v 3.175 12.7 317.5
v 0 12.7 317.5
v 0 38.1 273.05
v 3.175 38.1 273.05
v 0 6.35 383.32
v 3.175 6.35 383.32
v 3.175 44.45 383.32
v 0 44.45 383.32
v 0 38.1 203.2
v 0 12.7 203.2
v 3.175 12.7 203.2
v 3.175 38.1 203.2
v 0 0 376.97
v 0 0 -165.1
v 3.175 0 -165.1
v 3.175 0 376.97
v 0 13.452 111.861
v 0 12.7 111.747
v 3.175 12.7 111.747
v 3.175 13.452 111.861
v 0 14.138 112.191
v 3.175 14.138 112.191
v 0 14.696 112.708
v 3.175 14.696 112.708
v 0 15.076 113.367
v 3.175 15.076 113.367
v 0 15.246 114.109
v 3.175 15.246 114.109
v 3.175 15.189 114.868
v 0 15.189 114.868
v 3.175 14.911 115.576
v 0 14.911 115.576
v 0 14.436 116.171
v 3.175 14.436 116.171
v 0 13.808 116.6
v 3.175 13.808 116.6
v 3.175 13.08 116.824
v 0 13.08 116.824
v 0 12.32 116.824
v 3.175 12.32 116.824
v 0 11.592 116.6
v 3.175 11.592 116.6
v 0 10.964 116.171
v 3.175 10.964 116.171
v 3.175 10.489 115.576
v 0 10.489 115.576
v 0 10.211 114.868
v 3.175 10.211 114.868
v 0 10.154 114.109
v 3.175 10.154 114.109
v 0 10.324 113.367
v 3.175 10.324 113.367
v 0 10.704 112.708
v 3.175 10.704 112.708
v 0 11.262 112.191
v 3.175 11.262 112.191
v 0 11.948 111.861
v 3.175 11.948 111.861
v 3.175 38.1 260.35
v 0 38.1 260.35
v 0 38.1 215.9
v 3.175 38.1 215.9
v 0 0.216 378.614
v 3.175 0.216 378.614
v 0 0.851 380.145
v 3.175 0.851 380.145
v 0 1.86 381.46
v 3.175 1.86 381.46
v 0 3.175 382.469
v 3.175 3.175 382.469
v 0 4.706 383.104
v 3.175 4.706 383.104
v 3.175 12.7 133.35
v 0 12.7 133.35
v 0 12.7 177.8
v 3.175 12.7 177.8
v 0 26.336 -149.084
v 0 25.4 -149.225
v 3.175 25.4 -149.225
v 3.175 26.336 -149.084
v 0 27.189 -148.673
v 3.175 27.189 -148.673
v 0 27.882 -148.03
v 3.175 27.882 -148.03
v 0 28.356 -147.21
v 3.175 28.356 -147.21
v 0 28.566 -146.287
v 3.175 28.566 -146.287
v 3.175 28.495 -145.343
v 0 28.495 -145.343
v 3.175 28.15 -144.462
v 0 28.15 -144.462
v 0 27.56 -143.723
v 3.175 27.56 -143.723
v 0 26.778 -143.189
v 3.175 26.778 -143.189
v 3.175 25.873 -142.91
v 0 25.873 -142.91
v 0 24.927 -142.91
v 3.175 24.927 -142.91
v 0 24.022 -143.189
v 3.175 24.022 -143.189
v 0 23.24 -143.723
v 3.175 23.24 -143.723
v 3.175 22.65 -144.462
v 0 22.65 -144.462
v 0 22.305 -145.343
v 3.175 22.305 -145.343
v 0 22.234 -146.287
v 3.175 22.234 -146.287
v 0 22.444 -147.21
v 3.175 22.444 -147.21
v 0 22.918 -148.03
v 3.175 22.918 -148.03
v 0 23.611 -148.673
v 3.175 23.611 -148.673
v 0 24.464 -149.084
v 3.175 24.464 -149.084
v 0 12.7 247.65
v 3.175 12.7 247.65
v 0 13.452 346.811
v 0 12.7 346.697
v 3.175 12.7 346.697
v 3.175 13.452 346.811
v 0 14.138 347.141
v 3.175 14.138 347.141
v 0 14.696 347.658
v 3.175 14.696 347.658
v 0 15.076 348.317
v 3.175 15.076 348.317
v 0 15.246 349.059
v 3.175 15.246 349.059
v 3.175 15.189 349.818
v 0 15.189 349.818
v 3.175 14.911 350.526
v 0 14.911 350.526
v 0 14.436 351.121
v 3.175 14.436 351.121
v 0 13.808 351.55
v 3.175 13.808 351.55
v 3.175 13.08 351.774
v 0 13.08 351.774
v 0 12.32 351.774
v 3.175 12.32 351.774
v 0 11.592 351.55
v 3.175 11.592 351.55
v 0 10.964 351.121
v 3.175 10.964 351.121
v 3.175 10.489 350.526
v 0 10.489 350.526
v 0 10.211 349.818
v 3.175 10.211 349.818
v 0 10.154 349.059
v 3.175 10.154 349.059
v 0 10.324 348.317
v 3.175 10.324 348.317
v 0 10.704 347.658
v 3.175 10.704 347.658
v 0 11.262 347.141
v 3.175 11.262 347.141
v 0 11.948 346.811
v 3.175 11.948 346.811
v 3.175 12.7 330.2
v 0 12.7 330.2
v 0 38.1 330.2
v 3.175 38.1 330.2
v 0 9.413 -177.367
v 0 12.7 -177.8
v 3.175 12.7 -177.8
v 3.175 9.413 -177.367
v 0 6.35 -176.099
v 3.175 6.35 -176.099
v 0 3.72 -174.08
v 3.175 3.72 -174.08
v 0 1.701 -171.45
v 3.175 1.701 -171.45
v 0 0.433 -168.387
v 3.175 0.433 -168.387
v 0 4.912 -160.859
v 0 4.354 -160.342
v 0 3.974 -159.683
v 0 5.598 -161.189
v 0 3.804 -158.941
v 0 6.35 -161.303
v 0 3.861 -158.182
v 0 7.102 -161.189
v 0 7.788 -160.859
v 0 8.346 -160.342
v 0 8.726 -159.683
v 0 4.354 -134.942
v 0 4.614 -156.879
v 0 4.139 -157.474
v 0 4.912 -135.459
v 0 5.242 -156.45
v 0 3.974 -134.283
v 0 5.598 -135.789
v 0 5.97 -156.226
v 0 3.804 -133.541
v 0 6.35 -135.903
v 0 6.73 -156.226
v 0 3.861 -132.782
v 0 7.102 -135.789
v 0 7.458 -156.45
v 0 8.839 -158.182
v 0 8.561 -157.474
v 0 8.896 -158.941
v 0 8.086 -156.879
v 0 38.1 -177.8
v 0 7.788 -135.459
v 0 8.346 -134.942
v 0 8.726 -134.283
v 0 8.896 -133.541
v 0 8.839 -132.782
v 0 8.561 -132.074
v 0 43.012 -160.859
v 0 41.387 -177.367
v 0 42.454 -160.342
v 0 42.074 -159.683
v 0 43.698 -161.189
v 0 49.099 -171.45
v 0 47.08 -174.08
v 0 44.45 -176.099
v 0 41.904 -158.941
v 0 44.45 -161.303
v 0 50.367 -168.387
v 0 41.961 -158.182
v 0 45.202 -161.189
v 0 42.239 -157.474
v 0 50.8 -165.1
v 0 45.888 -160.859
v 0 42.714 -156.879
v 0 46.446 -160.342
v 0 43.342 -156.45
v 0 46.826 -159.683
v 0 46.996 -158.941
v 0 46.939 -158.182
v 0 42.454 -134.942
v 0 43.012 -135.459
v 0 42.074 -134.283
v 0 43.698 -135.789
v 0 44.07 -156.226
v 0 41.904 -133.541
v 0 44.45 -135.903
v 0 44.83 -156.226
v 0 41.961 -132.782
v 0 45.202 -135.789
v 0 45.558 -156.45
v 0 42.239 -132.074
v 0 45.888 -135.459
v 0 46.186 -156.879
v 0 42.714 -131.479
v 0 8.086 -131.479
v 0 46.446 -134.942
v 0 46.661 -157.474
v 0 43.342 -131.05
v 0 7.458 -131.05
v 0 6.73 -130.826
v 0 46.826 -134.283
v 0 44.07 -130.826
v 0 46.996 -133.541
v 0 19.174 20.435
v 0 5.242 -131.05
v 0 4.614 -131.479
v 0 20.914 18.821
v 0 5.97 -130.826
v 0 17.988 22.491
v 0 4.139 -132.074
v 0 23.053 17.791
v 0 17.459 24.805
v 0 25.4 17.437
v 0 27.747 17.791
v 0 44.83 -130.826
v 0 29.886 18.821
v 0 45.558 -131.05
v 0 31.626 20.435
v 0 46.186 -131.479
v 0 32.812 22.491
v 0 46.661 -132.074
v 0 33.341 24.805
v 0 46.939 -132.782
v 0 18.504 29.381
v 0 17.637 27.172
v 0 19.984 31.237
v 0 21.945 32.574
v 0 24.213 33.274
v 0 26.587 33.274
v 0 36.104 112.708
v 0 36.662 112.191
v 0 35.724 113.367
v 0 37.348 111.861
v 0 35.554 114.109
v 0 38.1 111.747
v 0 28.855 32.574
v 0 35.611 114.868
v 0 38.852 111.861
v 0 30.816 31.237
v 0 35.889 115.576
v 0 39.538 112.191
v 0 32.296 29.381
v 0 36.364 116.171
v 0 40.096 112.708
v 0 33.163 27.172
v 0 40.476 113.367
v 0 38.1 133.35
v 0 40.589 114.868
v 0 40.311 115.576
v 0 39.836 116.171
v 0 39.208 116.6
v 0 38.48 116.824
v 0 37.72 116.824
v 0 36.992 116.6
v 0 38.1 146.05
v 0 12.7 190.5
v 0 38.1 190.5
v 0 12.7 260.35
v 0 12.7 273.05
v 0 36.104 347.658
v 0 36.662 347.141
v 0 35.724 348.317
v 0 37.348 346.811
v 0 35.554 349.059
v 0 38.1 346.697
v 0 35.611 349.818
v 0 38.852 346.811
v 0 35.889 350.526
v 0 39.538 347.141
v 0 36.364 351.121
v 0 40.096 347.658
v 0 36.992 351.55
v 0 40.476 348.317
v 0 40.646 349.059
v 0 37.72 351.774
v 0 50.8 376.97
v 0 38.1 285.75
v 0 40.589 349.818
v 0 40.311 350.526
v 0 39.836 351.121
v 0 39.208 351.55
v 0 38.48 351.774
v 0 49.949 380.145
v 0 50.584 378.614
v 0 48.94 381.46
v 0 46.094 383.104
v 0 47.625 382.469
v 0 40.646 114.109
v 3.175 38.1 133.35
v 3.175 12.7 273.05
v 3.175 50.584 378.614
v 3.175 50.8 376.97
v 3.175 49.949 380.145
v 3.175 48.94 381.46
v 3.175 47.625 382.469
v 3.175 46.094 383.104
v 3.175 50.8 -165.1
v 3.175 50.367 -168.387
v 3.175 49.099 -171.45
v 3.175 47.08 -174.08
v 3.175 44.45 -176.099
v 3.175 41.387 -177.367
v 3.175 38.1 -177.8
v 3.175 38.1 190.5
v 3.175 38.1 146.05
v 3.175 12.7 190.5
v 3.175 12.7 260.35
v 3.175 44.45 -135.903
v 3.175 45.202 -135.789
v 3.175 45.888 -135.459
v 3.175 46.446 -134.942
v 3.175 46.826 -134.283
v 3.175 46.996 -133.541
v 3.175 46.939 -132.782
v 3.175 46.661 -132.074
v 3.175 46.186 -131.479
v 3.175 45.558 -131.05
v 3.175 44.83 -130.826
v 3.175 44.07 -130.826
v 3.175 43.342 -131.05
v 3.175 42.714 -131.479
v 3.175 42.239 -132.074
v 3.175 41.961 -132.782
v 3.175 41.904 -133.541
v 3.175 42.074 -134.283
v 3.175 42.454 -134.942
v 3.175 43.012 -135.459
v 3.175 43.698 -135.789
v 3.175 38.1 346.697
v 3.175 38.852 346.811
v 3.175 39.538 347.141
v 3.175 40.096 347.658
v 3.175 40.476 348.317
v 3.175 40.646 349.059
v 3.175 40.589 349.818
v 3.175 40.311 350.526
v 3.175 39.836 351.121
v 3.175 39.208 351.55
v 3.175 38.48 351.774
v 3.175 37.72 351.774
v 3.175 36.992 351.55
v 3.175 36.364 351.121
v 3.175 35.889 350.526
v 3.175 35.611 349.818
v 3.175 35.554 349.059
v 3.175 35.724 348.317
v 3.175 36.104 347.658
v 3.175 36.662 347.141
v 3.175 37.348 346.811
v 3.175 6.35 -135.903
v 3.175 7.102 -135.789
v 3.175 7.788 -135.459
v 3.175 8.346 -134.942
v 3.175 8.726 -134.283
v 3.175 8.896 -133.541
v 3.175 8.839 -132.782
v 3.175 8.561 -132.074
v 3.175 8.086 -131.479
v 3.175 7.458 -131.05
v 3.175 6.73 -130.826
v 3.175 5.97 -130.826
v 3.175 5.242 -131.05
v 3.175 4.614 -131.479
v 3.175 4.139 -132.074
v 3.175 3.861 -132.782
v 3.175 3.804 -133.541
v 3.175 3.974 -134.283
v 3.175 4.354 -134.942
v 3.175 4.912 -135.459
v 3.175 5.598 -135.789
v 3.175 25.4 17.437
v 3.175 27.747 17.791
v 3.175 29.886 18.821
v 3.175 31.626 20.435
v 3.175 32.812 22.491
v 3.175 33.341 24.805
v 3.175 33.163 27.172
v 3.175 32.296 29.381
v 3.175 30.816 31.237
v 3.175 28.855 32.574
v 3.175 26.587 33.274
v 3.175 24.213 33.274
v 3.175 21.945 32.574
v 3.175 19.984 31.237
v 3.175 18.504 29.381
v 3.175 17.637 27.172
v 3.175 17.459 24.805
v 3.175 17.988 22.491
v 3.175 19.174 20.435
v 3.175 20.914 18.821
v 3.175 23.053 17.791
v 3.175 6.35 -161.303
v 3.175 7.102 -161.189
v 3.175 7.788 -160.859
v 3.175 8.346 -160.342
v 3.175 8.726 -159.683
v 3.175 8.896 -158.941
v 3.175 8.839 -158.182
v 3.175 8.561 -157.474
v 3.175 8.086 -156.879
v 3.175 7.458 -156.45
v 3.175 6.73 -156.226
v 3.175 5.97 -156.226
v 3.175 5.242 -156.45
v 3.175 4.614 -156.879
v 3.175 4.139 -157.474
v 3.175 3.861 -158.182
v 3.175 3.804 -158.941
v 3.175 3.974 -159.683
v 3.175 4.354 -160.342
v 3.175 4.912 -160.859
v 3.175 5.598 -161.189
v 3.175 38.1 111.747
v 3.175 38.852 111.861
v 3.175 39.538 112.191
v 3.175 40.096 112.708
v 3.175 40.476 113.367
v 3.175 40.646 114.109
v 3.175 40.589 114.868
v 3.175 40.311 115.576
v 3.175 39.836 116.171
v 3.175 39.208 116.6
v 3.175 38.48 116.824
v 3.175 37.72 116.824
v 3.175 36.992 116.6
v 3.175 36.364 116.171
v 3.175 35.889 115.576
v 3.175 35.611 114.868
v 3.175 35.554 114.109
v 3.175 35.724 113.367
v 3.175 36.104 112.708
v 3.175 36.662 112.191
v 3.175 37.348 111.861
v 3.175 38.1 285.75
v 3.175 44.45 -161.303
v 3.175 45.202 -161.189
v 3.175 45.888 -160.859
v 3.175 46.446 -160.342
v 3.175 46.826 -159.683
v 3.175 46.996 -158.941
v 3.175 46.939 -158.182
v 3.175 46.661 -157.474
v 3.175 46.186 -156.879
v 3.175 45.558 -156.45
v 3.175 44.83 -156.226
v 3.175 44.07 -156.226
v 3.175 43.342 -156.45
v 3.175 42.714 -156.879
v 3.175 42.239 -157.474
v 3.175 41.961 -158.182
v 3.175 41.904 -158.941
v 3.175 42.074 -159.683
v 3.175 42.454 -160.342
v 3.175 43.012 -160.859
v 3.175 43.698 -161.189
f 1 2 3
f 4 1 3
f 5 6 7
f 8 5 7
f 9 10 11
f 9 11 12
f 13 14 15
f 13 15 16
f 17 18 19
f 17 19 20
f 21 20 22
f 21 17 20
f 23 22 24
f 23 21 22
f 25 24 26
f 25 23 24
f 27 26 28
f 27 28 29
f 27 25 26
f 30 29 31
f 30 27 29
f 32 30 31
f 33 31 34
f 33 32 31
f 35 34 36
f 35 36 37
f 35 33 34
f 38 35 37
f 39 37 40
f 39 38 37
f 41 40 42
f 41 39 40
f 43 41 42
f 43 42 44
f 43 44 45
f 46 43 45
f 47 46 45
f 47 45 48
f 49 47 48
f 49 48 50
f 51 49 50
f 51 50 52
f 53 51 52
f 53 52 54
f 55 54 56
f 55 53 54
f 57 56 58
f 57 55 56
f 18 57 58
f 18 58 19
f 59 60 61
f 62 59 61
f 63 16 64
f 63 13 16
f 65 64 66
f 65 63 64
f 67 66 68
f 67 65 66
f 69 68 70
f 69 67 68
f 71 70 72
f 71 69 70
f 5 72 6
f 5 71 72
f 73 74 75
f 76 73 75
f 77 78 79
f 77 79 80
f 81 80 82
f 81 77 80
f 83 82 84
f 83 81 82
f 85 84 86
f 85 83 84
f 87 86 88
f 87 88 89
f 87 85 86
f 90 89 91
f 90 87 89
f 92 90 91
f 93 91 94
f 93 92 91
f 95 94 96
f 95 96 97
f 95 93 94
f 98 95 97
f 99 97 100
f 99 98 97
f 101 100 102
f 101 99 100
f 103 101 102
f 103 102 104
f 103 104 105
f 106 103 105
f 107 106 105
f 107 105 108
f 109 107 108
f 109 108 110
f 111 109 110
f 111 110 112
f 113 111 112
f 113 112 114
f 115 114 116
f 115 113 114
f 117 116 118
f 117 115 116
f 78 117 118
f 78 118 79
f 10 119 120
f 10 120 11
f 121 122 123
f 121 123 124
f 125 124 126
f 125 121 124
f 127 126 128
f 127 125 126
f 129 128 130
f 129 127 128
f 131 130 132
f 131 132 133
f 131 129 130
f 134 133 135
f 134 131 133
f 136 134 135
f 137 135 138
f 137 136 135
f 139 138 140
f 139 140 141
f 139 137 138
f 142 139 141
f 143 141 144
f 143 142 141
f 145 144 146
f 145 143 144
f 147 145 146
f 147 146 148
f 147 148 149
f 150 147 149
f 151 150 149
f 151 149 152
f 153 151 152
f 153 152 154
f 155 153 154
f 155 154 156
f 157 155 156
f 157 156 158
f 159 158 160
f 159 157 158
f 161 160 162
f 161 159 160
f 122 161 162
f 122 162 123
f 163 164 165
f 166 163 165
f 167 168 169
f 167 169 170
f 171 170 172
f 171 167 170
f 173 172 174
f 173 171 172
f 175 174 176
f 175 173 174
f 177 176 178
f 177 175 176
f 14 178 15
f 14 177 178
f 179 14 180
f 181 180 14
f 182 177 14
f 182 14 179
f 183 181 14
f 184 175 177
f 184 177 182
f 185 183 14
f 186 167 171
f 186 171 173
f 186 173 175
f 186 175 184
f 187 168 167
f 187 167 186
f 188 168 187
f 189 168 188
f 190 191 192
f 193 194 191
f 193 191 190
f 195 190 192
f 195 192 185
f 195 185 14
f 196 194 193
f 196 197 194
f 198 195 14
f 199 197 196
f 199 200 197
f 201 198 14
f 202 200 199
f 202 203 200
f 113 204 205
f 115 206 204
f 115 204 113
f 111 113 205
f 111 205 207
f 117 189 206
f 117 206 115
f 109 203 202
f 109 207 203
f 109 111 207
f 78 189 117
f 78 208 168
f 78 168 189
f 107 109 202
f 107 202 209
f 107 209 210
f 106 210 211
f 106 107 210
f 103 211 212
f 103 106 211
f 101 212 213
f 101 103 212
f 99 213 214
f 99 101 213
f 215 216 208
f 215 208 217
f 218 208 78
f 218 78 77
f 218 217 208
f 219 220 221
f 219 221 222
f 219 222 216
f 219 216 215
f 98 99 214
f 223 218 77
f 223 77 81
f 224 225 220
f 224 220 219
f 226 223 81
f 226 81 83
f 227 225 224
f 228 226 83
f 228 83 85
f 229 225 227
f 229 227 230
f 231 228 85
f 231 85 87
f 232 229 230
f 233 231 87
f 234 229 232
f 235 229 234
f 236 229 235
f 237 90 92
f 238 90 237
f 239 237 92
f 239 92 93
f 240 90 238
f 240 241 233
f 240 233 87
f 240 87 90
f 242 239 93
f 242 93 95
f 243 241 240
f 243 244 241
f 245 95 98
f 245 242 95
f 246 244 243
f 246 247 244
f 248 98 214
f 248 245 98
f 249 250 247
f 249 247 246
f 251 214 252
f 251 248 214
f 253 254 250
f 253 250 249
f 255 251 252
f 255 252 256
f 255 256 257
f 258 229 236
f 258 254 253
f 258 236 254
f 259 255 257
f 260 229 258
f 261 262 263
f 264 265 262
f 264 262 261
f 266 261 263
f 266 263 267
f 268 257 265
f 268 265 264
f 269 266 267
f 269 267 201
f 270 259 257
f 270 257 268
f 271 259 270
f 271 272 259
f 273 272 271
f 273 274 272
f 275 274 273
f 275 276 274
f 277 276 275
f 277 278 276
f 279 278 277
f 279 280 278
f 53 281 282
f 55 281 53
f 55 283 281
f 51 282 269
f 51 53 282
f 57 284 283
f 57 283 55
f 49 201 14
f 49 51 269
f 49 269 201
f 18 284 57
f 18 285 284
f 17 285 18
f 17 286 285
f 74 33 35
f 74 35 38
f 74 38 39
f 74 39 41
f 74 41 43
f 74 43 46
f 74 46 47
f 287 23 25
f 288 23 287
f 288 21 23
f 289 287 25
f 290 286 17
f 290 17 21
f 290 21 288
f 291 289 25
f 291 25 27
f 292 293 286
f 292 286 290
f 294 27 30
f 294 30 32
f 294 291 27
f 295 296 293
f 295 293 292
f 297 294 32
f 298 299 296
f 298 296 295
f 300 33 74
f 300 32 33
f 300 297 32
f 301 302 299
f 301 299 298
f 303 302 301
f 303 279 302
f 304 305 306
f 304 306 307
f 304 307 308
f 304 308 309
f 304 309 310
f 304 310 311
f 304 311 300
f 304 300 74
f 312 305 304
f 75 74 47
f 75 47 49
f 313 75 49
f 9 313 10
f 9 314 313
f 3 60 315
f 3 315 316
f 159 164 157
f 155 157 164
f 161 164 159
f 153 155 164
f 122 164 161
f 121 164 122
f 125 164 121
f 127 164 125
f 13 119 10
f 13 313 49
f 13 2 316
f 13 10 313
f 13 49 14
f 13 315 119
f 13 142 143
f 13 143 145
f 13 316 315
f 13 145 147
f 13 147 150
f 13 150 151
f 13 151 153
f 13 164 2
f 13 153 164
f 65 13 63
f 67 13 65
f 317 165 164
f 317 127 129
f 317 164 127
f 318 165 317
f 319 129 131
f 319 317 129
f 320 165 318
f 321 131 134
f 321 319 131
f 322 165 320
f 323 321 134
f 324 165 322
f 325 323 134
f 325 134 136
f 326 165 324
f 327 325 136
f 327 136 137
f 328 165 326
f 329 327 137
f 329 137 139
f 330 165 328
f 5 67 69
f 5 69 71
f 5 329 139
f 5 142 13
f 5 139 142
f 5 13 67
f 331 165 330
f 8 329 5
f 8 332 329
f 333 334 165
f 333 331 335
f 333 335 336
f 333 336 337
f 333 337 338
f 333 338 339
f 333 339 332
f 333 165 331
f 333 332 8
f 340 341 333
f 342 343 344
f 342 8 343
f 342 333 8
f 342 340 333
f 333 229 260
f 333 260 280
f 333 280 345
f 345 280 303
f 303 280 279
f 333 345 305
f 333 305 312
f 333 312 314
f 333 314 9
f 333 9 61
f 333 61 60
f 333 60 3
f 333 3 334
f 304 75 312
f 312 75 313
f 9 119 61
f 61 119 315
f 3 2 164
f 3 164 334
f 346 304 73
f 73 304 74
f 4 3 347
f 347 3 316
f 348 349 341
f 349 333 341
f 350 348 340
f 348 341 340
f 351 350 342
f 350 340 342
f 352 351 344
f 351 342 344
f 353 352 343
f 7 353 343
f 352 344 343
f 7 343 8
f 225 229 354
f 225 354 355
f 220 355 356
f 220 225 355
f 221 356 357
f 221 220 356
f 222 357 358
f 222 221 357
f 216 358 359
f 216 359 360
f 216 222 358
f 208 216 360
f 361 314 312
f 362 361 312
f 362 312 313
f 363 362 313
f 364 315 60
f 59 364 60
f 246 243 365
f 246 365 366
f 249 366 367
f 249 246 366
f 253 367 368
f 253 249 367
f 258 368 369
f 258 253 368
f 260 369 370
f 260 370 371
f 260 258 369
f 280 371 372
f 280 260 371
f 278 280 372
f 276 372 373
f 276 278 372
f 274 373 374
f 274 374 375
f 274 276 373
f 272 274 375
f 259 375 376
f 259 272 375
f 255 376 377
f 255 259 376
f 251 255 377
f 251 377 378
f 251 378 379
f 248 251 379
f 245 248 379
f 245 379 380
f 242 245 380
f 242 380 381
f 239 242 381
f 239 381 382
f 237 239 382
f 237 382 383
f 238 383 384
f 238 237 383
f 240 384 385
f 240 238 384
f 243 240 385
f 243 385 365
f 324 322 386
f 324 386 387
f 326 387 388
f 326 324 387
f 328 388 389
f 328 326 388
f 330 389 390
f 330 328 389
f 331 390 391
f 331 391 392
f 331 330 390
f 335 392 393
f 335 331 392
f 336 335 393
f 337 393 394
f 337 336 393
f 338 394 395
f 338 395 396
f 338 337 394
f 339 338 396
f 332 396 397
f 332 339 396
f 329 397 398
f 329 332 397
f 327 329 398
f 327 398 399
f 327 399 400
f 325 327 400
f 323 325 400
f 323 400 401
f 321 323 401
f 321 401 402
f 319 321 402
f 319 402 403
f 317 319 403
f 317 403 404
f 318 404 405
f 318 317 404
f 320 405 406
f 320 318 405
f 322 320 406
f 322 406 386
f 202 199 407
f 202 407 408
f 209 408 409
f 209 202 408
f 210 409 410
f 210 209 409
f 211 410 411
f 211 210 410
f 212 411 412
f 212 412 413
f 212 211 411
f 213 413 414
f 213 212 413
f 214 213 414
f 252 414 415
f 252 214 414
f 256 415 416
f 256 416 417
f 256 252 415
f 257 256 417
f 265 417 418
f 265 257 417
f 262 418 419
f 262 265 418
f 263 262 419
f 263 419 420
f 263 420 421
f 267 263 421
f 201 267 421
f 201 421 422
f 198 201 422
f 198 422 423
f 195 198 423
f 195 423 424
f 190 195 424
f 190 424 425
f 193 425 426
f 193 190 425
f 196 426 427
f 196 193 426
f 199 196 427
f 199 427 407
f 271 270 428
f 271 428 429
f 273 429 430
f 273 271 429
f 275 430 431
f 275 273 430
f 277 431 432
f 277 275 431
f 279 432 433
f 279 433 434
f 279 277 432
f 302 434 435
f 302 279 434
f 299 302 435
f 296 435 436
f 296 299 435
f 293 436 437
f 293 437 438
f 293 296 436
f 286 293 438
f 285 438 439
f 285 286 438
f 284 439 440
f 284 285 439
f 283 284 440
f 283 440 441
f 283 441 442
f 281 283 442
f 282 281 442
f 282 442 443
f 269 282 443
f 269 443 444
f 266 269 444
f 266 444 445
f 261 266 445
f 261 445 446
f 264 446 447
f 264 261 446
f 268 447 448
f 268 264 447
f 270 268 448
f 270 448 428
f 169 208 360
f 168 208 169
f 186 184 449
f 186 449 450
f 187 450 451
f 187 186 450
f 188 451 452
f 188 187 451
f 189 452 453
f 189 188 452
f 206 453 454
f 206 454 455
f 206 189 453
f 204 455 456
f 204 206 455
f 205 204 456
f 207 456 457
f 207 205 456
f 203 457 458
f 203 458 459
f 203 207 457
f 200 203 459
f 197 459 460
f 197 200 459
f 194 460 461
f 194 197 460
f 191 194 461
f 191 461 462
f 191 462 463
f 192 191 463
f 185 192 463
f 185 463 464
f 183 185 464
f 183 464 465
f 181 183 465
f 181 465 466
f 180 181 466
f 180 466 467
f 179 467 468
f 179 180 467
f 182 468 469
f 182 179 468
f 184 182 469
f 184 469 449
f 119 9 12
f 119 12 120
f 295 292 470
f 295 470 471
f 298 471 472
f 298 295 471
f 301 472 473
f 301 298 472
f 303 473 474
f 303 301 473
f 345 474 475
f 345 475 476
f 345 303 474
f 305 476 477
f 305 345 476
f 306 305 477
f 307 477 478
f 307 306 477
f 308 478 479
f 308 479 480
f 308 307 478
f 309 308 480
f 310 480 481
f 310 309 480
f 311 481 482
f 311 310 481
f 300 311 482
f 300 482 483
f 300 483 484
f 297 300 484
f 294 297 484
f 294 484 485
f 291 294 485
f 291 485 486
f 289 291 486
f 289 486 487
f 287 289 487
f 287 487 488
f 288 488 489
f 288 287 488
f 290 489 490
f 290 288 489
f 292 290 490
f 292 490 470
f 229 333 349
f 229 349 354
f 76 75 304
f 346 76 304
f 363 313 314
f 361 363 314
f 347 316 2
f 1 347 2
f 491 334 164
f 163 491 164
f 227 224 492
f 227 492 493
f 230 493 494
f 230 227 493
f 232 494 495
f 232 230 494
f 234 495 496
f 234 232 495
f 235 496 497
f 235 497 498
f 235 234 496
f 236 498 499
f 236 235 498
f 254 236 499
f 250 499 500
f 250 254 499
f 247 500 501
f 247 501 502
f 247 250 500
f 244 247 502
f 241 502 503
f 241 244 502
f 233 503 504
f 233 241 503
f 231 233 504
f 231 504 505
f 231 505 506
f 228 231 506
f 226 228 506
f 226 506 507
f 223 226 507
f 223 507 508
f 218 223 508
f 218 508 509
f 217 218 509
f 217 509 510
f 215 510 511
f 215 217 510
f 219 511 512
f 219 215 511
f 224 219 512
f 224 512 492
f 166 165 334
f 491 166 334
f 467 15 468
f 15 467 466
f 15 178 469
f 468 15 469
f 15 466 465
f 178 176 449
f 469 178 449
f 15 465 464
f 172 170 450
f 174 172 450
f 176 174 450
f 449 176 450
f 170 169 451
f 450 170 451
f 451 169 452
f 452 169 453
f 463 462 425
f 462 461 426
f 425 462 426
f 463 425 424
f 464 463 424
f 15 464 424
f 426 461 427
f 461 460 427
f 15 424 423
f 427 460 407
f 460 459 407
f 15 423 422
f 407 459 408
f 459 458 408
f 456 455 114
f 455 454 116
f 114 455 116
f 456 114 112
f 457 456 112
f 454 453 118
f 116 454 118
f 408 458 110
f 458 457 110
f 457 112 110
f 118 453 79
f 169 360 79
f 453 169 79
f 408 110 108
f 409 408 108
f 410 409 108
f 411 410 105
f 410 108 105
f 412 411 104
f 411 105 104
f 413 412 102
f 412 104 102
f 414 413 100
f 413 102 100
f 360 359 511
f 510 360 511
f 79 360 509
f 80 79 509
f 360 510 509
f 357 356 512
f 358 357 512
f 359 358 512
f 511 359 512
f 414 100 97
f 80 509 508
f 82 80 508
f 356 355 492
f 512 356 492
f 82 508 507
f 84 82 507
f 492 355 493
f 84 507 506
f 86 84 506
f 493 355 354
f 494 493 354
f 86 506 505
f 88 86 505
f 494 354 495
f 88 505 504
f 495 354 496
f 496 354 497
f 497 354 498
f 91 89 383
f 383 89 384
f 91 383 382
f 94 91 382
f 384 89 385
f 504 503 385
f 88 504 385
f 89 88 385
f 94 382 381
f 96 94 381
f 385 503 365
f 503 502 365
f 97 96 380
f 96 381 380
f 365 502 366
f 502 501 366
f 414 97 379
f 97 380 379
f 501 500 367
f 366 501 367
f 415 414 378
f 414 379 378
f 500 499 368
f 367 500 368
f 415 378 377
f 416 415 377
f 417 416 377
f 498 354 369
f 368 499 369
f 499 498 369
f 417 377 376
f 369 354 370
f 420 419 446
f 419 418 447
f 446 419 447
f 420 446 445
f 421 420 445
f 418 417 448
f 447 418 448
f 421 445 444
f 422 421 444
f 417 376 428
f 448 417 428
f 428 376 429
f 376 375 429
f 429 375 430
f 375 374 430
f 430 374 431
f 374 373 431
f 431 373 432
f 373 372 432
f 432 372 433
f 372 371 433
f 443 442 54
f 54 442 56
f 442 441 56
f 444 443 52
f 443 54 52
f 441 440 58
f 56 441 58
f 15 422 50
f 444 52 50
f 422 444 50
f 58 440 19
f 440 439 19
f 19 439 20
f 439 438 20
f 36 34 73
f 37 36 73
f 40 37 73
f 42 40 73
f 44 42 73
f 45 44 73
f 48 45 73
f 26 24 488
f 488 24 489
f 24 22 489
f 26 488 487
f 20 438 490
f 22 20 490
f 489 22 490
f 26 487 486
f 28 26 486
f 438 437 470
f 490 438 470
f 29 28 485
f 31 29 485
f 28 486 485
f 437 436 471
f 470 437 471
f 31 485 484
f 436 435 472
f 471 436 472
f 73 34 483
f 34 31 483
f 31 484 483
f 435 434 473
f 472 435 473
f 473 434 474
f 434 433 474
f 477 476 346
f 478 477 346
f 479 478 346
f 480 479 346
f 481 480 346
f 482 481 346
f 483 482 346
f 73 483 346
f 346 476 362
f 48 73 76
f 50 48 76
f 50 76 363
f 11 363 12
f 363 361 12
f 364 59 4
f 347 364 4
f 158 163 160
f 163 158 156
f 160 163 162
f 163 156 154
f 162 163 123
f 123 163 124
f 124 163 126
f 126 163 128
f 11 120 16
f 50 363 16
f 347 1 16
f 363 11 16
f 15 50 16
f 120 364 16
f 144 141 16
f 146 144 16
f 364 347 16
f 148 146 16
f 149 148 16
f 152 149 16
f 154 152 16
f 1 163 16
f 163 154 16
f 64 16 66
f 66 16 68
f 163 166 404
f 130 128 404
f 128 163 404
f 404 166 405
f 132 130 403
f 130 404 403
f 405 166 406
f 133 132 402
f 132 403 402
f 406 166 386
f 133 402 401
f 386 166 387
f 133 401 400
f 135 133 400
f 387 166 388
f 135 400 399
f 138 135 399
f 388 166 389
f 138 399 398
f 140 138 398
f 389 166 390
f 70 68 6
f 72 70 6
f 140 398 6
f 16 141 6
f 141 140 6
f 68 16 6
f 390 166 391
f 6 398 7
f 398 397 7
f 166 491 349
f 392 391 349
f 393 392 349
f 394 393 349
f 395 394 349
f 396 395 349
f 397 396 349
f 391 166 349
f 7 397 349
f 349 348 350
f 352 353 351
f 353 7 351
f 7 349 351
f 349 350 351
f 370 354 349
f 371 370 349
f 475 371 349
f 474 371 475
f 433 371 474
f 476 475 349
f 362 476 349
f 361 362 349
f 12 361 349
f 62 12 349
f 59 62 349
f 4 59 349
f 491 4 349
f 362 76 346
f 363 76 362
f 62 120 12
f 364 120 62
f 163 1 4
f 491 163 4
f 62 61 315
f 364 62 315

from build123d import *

# Parameters (mm, degrees)
SKETCH1_R           = 7.9629
SKETCH1_R_2         = 3.175
SKETCH1_R_3         = 2.5527
BOSS_EXTRUDE1_DEPTH = 3.175
SKETCH2_R           = 5.55625
CUT_EXTRUDE1_DEPTH  = 4.175
SKETCH3_W           = 200.88
SKETCH3_H           = 50.8
CUT_EXTRUDE2_DEPTH  = 4.175
FILLET1_R           = 6.35


with BuildPart() as part:
    # Sketch1 → Boss-Extrude1 (new body)
    with BuildSketch(Plane(origin=(0, 0, 0), x_dir=(0, 0, -1), z_dir=(1, 0, 0))):
        with BuildLine():
            Line((177.8, 38.1), (177.8, 12.7))
            ThreePointArc((177.8, 12.7), (174.080256121, 3.719743879), (165.1, 0))
            Line((165.1, 0), (-571.5, 0))
            ThreePointArc((-571.5, 0), (-580.480256121, 3.719743879), (-584.2, 12.7))
            Line((-584.2, 12.7), (-584.2, 38.1))
            ThreePointArc((-584.2, 38.1), (-580.480256121, 47.080256121), (-571.5, 50.8))
            Line((-571.5, 50.8), (165.1, 50.8))
            ThreePointArc((165.1, 50.8), (174.080256121, 47.080256121), (177.8, 38.1))
        make_face()
        with Locations((-25.4, 25.4)):
            Circle(SKETCH1_R, mode=Mode.SUBTRACT)
        with Locations((146.05, 25.4)):
            Circle(SKETCH1_R_2, mode=Mode.SUBTRACT)
        with Locations((-349.25, 38.1)):
            Circle(SKETCH1_R_3, mode=Mode.SUBTRACT)
        with Locations((-349.25, 12.7)):
            Circle(SKETCH1_R_3, mode=Mode.SUBTRACT)
        with Locations((-114.3, 38.1)):
            Circle(SKETCH1_R_3, mode=Mode.SUBTRACT)
        with Locations((-114.3, 12.7)):
            Circle(SKETCH1_R_3, mode=Mode.SUBTRACT)
        with Locations((133.35, 44.45)):
            Circle(SKETCH1_R_3, mode=Mode.SUBTRACT)
        with Locations((158.75, 44.45)):
            Circle(SKETCH1_R_3, mode=Mode.SUBTRACT)
        with Locations((158.75, 6.35)):
            Circle(SKETCH1_R_3, mode=Mode.SUBTRACT)
        with Locations((133.35, 6.35)):
            Circle(SKETCH1_R_3, mode=Mode.SUBTRACT)
        Polygon((-190.5, 38.1), (-146.05, 38.1), (-190.5, 12.7), align=None, mode=Mode.SUBTRACT)
        Polygon((-133.35, 38.1), (-133.35, 12.7), (-177.8, 12.7), align=None, mode=Mode.SUBTRACT)
        Polygon((-203.2, 12.7), (-203.2, 38.1), (-247.65, 12.7), align=None, mode=Mode.SUBTRACT)
        Polygon((-215.9, 38.1), (-260.35, 12.7), (-260.35, 38.1), align=None, mode=Mode.SUBTRACT)
        Polygon((-273.05, 38.1), (-273.05, 12.7), (-317.5, 12.7), align=None, mode=Mode.SUBTRACT)
        Polygon((-330.2, 12.7), (-330.2, 38.1), (-285.75, 38.1), align=None, mode=Mode.SUBTRACT)
    extrude(amount=BOSS_EXTRUDE1_DEPTH)

    # Sketch2 → Cut-Extrude1 (cut, through all)
    with BuildSketch(Plane(origin=(3.175, 0, 0), x_dir=(0, 0, -1), z_dir=(1, 0, 0))):
        with Locations((-558.8, 25.4)):
            Circle(SKETCH2_R)
    extrude(amount=-CUT_EXTRUDE1_DEPTH, mode=Mode.SUBTRACT)

    # Sketch3 → Cut-Extrude2 (cut, through all)
    with BuildSketch(Plane(origin=(3.175, 0, 0), x_dir=(0, 0, -1), z_dir=(1, 0, 0))):
        with Locations((-483.76, 25.4)):
            Rectangle(SKETCH3_W, SKETCH3_H)
    extrude(amount=-CUT_EXTRUDE2_DEPTH, mode=Mode.SUBTRACT)

    # Fillet1
    fillet1_edges = [part.edges().sort_by_distance(p)[0] for p in [
        (1.5875, 0, 383.32),
        (1.5875, 50.8, 383.32),
    ]]
    fillet(fillet1_edges, radius=FILLET1_R)


solid = part.part
